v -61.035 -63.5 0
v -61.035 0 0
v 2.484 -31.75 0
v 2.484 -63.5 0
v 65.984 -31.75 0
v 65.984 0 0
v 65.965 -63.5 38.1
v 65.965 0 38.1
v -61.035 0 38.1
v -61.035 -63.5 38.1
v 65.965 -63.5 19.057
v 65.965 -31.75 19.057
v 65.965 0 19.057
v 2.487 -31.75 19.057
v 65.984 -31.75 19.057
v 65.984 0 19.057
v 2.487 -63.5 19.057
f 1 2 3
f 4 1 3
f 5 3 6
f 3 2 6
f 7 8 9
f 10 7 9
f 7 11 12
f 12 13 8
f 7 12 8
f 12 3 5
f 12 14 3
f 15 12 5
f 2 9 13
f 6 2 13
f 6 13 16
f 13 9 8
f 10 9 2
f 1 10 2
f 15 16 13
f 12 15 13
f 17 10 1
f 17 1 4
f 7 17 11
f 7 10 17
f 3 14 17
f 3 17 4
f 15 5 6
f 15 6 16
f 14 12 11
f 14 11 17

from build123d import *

# Parameters (mm, degrees)
F1_DEPTH = 63.5
F3_DEPTH = 72.136
F4_DEPTH = 31.75


with BuildPart() as f1:
    # F0 (on Front) → F1 (new body)
    with BuildSketch(Plane.XZ):
        Polygon((65.964764, 38.1), (-61.035236, 38.1), (-61.035236, 0), (2.464764, 0), (65.979816, 0), (65.964764, 19.05), align=None)
    extrude(amount=F1_DEPTH)

    # F2 (on Front) → F3 (cut)
    with BuildSketch(Plane.XZ):
        Polygon((2.483717, 0), (65.983717, 0), (65.983717, 19.056977), (2.487009, 19.056977), align=None)
    extrude(amount=F3_DEPTH, mode=Mode.SUBTRACT)

    # F2 (on Front) → F4 (join)
    with BuildSketch(Plane.XZ):
        Polygon((2.483717, 0), (65.983717, 0), (65.983717, 19.056977), (2.487009, 19.056977), align=None)
    extrude(amount=F4_DEPTH)


solid = f1.part
